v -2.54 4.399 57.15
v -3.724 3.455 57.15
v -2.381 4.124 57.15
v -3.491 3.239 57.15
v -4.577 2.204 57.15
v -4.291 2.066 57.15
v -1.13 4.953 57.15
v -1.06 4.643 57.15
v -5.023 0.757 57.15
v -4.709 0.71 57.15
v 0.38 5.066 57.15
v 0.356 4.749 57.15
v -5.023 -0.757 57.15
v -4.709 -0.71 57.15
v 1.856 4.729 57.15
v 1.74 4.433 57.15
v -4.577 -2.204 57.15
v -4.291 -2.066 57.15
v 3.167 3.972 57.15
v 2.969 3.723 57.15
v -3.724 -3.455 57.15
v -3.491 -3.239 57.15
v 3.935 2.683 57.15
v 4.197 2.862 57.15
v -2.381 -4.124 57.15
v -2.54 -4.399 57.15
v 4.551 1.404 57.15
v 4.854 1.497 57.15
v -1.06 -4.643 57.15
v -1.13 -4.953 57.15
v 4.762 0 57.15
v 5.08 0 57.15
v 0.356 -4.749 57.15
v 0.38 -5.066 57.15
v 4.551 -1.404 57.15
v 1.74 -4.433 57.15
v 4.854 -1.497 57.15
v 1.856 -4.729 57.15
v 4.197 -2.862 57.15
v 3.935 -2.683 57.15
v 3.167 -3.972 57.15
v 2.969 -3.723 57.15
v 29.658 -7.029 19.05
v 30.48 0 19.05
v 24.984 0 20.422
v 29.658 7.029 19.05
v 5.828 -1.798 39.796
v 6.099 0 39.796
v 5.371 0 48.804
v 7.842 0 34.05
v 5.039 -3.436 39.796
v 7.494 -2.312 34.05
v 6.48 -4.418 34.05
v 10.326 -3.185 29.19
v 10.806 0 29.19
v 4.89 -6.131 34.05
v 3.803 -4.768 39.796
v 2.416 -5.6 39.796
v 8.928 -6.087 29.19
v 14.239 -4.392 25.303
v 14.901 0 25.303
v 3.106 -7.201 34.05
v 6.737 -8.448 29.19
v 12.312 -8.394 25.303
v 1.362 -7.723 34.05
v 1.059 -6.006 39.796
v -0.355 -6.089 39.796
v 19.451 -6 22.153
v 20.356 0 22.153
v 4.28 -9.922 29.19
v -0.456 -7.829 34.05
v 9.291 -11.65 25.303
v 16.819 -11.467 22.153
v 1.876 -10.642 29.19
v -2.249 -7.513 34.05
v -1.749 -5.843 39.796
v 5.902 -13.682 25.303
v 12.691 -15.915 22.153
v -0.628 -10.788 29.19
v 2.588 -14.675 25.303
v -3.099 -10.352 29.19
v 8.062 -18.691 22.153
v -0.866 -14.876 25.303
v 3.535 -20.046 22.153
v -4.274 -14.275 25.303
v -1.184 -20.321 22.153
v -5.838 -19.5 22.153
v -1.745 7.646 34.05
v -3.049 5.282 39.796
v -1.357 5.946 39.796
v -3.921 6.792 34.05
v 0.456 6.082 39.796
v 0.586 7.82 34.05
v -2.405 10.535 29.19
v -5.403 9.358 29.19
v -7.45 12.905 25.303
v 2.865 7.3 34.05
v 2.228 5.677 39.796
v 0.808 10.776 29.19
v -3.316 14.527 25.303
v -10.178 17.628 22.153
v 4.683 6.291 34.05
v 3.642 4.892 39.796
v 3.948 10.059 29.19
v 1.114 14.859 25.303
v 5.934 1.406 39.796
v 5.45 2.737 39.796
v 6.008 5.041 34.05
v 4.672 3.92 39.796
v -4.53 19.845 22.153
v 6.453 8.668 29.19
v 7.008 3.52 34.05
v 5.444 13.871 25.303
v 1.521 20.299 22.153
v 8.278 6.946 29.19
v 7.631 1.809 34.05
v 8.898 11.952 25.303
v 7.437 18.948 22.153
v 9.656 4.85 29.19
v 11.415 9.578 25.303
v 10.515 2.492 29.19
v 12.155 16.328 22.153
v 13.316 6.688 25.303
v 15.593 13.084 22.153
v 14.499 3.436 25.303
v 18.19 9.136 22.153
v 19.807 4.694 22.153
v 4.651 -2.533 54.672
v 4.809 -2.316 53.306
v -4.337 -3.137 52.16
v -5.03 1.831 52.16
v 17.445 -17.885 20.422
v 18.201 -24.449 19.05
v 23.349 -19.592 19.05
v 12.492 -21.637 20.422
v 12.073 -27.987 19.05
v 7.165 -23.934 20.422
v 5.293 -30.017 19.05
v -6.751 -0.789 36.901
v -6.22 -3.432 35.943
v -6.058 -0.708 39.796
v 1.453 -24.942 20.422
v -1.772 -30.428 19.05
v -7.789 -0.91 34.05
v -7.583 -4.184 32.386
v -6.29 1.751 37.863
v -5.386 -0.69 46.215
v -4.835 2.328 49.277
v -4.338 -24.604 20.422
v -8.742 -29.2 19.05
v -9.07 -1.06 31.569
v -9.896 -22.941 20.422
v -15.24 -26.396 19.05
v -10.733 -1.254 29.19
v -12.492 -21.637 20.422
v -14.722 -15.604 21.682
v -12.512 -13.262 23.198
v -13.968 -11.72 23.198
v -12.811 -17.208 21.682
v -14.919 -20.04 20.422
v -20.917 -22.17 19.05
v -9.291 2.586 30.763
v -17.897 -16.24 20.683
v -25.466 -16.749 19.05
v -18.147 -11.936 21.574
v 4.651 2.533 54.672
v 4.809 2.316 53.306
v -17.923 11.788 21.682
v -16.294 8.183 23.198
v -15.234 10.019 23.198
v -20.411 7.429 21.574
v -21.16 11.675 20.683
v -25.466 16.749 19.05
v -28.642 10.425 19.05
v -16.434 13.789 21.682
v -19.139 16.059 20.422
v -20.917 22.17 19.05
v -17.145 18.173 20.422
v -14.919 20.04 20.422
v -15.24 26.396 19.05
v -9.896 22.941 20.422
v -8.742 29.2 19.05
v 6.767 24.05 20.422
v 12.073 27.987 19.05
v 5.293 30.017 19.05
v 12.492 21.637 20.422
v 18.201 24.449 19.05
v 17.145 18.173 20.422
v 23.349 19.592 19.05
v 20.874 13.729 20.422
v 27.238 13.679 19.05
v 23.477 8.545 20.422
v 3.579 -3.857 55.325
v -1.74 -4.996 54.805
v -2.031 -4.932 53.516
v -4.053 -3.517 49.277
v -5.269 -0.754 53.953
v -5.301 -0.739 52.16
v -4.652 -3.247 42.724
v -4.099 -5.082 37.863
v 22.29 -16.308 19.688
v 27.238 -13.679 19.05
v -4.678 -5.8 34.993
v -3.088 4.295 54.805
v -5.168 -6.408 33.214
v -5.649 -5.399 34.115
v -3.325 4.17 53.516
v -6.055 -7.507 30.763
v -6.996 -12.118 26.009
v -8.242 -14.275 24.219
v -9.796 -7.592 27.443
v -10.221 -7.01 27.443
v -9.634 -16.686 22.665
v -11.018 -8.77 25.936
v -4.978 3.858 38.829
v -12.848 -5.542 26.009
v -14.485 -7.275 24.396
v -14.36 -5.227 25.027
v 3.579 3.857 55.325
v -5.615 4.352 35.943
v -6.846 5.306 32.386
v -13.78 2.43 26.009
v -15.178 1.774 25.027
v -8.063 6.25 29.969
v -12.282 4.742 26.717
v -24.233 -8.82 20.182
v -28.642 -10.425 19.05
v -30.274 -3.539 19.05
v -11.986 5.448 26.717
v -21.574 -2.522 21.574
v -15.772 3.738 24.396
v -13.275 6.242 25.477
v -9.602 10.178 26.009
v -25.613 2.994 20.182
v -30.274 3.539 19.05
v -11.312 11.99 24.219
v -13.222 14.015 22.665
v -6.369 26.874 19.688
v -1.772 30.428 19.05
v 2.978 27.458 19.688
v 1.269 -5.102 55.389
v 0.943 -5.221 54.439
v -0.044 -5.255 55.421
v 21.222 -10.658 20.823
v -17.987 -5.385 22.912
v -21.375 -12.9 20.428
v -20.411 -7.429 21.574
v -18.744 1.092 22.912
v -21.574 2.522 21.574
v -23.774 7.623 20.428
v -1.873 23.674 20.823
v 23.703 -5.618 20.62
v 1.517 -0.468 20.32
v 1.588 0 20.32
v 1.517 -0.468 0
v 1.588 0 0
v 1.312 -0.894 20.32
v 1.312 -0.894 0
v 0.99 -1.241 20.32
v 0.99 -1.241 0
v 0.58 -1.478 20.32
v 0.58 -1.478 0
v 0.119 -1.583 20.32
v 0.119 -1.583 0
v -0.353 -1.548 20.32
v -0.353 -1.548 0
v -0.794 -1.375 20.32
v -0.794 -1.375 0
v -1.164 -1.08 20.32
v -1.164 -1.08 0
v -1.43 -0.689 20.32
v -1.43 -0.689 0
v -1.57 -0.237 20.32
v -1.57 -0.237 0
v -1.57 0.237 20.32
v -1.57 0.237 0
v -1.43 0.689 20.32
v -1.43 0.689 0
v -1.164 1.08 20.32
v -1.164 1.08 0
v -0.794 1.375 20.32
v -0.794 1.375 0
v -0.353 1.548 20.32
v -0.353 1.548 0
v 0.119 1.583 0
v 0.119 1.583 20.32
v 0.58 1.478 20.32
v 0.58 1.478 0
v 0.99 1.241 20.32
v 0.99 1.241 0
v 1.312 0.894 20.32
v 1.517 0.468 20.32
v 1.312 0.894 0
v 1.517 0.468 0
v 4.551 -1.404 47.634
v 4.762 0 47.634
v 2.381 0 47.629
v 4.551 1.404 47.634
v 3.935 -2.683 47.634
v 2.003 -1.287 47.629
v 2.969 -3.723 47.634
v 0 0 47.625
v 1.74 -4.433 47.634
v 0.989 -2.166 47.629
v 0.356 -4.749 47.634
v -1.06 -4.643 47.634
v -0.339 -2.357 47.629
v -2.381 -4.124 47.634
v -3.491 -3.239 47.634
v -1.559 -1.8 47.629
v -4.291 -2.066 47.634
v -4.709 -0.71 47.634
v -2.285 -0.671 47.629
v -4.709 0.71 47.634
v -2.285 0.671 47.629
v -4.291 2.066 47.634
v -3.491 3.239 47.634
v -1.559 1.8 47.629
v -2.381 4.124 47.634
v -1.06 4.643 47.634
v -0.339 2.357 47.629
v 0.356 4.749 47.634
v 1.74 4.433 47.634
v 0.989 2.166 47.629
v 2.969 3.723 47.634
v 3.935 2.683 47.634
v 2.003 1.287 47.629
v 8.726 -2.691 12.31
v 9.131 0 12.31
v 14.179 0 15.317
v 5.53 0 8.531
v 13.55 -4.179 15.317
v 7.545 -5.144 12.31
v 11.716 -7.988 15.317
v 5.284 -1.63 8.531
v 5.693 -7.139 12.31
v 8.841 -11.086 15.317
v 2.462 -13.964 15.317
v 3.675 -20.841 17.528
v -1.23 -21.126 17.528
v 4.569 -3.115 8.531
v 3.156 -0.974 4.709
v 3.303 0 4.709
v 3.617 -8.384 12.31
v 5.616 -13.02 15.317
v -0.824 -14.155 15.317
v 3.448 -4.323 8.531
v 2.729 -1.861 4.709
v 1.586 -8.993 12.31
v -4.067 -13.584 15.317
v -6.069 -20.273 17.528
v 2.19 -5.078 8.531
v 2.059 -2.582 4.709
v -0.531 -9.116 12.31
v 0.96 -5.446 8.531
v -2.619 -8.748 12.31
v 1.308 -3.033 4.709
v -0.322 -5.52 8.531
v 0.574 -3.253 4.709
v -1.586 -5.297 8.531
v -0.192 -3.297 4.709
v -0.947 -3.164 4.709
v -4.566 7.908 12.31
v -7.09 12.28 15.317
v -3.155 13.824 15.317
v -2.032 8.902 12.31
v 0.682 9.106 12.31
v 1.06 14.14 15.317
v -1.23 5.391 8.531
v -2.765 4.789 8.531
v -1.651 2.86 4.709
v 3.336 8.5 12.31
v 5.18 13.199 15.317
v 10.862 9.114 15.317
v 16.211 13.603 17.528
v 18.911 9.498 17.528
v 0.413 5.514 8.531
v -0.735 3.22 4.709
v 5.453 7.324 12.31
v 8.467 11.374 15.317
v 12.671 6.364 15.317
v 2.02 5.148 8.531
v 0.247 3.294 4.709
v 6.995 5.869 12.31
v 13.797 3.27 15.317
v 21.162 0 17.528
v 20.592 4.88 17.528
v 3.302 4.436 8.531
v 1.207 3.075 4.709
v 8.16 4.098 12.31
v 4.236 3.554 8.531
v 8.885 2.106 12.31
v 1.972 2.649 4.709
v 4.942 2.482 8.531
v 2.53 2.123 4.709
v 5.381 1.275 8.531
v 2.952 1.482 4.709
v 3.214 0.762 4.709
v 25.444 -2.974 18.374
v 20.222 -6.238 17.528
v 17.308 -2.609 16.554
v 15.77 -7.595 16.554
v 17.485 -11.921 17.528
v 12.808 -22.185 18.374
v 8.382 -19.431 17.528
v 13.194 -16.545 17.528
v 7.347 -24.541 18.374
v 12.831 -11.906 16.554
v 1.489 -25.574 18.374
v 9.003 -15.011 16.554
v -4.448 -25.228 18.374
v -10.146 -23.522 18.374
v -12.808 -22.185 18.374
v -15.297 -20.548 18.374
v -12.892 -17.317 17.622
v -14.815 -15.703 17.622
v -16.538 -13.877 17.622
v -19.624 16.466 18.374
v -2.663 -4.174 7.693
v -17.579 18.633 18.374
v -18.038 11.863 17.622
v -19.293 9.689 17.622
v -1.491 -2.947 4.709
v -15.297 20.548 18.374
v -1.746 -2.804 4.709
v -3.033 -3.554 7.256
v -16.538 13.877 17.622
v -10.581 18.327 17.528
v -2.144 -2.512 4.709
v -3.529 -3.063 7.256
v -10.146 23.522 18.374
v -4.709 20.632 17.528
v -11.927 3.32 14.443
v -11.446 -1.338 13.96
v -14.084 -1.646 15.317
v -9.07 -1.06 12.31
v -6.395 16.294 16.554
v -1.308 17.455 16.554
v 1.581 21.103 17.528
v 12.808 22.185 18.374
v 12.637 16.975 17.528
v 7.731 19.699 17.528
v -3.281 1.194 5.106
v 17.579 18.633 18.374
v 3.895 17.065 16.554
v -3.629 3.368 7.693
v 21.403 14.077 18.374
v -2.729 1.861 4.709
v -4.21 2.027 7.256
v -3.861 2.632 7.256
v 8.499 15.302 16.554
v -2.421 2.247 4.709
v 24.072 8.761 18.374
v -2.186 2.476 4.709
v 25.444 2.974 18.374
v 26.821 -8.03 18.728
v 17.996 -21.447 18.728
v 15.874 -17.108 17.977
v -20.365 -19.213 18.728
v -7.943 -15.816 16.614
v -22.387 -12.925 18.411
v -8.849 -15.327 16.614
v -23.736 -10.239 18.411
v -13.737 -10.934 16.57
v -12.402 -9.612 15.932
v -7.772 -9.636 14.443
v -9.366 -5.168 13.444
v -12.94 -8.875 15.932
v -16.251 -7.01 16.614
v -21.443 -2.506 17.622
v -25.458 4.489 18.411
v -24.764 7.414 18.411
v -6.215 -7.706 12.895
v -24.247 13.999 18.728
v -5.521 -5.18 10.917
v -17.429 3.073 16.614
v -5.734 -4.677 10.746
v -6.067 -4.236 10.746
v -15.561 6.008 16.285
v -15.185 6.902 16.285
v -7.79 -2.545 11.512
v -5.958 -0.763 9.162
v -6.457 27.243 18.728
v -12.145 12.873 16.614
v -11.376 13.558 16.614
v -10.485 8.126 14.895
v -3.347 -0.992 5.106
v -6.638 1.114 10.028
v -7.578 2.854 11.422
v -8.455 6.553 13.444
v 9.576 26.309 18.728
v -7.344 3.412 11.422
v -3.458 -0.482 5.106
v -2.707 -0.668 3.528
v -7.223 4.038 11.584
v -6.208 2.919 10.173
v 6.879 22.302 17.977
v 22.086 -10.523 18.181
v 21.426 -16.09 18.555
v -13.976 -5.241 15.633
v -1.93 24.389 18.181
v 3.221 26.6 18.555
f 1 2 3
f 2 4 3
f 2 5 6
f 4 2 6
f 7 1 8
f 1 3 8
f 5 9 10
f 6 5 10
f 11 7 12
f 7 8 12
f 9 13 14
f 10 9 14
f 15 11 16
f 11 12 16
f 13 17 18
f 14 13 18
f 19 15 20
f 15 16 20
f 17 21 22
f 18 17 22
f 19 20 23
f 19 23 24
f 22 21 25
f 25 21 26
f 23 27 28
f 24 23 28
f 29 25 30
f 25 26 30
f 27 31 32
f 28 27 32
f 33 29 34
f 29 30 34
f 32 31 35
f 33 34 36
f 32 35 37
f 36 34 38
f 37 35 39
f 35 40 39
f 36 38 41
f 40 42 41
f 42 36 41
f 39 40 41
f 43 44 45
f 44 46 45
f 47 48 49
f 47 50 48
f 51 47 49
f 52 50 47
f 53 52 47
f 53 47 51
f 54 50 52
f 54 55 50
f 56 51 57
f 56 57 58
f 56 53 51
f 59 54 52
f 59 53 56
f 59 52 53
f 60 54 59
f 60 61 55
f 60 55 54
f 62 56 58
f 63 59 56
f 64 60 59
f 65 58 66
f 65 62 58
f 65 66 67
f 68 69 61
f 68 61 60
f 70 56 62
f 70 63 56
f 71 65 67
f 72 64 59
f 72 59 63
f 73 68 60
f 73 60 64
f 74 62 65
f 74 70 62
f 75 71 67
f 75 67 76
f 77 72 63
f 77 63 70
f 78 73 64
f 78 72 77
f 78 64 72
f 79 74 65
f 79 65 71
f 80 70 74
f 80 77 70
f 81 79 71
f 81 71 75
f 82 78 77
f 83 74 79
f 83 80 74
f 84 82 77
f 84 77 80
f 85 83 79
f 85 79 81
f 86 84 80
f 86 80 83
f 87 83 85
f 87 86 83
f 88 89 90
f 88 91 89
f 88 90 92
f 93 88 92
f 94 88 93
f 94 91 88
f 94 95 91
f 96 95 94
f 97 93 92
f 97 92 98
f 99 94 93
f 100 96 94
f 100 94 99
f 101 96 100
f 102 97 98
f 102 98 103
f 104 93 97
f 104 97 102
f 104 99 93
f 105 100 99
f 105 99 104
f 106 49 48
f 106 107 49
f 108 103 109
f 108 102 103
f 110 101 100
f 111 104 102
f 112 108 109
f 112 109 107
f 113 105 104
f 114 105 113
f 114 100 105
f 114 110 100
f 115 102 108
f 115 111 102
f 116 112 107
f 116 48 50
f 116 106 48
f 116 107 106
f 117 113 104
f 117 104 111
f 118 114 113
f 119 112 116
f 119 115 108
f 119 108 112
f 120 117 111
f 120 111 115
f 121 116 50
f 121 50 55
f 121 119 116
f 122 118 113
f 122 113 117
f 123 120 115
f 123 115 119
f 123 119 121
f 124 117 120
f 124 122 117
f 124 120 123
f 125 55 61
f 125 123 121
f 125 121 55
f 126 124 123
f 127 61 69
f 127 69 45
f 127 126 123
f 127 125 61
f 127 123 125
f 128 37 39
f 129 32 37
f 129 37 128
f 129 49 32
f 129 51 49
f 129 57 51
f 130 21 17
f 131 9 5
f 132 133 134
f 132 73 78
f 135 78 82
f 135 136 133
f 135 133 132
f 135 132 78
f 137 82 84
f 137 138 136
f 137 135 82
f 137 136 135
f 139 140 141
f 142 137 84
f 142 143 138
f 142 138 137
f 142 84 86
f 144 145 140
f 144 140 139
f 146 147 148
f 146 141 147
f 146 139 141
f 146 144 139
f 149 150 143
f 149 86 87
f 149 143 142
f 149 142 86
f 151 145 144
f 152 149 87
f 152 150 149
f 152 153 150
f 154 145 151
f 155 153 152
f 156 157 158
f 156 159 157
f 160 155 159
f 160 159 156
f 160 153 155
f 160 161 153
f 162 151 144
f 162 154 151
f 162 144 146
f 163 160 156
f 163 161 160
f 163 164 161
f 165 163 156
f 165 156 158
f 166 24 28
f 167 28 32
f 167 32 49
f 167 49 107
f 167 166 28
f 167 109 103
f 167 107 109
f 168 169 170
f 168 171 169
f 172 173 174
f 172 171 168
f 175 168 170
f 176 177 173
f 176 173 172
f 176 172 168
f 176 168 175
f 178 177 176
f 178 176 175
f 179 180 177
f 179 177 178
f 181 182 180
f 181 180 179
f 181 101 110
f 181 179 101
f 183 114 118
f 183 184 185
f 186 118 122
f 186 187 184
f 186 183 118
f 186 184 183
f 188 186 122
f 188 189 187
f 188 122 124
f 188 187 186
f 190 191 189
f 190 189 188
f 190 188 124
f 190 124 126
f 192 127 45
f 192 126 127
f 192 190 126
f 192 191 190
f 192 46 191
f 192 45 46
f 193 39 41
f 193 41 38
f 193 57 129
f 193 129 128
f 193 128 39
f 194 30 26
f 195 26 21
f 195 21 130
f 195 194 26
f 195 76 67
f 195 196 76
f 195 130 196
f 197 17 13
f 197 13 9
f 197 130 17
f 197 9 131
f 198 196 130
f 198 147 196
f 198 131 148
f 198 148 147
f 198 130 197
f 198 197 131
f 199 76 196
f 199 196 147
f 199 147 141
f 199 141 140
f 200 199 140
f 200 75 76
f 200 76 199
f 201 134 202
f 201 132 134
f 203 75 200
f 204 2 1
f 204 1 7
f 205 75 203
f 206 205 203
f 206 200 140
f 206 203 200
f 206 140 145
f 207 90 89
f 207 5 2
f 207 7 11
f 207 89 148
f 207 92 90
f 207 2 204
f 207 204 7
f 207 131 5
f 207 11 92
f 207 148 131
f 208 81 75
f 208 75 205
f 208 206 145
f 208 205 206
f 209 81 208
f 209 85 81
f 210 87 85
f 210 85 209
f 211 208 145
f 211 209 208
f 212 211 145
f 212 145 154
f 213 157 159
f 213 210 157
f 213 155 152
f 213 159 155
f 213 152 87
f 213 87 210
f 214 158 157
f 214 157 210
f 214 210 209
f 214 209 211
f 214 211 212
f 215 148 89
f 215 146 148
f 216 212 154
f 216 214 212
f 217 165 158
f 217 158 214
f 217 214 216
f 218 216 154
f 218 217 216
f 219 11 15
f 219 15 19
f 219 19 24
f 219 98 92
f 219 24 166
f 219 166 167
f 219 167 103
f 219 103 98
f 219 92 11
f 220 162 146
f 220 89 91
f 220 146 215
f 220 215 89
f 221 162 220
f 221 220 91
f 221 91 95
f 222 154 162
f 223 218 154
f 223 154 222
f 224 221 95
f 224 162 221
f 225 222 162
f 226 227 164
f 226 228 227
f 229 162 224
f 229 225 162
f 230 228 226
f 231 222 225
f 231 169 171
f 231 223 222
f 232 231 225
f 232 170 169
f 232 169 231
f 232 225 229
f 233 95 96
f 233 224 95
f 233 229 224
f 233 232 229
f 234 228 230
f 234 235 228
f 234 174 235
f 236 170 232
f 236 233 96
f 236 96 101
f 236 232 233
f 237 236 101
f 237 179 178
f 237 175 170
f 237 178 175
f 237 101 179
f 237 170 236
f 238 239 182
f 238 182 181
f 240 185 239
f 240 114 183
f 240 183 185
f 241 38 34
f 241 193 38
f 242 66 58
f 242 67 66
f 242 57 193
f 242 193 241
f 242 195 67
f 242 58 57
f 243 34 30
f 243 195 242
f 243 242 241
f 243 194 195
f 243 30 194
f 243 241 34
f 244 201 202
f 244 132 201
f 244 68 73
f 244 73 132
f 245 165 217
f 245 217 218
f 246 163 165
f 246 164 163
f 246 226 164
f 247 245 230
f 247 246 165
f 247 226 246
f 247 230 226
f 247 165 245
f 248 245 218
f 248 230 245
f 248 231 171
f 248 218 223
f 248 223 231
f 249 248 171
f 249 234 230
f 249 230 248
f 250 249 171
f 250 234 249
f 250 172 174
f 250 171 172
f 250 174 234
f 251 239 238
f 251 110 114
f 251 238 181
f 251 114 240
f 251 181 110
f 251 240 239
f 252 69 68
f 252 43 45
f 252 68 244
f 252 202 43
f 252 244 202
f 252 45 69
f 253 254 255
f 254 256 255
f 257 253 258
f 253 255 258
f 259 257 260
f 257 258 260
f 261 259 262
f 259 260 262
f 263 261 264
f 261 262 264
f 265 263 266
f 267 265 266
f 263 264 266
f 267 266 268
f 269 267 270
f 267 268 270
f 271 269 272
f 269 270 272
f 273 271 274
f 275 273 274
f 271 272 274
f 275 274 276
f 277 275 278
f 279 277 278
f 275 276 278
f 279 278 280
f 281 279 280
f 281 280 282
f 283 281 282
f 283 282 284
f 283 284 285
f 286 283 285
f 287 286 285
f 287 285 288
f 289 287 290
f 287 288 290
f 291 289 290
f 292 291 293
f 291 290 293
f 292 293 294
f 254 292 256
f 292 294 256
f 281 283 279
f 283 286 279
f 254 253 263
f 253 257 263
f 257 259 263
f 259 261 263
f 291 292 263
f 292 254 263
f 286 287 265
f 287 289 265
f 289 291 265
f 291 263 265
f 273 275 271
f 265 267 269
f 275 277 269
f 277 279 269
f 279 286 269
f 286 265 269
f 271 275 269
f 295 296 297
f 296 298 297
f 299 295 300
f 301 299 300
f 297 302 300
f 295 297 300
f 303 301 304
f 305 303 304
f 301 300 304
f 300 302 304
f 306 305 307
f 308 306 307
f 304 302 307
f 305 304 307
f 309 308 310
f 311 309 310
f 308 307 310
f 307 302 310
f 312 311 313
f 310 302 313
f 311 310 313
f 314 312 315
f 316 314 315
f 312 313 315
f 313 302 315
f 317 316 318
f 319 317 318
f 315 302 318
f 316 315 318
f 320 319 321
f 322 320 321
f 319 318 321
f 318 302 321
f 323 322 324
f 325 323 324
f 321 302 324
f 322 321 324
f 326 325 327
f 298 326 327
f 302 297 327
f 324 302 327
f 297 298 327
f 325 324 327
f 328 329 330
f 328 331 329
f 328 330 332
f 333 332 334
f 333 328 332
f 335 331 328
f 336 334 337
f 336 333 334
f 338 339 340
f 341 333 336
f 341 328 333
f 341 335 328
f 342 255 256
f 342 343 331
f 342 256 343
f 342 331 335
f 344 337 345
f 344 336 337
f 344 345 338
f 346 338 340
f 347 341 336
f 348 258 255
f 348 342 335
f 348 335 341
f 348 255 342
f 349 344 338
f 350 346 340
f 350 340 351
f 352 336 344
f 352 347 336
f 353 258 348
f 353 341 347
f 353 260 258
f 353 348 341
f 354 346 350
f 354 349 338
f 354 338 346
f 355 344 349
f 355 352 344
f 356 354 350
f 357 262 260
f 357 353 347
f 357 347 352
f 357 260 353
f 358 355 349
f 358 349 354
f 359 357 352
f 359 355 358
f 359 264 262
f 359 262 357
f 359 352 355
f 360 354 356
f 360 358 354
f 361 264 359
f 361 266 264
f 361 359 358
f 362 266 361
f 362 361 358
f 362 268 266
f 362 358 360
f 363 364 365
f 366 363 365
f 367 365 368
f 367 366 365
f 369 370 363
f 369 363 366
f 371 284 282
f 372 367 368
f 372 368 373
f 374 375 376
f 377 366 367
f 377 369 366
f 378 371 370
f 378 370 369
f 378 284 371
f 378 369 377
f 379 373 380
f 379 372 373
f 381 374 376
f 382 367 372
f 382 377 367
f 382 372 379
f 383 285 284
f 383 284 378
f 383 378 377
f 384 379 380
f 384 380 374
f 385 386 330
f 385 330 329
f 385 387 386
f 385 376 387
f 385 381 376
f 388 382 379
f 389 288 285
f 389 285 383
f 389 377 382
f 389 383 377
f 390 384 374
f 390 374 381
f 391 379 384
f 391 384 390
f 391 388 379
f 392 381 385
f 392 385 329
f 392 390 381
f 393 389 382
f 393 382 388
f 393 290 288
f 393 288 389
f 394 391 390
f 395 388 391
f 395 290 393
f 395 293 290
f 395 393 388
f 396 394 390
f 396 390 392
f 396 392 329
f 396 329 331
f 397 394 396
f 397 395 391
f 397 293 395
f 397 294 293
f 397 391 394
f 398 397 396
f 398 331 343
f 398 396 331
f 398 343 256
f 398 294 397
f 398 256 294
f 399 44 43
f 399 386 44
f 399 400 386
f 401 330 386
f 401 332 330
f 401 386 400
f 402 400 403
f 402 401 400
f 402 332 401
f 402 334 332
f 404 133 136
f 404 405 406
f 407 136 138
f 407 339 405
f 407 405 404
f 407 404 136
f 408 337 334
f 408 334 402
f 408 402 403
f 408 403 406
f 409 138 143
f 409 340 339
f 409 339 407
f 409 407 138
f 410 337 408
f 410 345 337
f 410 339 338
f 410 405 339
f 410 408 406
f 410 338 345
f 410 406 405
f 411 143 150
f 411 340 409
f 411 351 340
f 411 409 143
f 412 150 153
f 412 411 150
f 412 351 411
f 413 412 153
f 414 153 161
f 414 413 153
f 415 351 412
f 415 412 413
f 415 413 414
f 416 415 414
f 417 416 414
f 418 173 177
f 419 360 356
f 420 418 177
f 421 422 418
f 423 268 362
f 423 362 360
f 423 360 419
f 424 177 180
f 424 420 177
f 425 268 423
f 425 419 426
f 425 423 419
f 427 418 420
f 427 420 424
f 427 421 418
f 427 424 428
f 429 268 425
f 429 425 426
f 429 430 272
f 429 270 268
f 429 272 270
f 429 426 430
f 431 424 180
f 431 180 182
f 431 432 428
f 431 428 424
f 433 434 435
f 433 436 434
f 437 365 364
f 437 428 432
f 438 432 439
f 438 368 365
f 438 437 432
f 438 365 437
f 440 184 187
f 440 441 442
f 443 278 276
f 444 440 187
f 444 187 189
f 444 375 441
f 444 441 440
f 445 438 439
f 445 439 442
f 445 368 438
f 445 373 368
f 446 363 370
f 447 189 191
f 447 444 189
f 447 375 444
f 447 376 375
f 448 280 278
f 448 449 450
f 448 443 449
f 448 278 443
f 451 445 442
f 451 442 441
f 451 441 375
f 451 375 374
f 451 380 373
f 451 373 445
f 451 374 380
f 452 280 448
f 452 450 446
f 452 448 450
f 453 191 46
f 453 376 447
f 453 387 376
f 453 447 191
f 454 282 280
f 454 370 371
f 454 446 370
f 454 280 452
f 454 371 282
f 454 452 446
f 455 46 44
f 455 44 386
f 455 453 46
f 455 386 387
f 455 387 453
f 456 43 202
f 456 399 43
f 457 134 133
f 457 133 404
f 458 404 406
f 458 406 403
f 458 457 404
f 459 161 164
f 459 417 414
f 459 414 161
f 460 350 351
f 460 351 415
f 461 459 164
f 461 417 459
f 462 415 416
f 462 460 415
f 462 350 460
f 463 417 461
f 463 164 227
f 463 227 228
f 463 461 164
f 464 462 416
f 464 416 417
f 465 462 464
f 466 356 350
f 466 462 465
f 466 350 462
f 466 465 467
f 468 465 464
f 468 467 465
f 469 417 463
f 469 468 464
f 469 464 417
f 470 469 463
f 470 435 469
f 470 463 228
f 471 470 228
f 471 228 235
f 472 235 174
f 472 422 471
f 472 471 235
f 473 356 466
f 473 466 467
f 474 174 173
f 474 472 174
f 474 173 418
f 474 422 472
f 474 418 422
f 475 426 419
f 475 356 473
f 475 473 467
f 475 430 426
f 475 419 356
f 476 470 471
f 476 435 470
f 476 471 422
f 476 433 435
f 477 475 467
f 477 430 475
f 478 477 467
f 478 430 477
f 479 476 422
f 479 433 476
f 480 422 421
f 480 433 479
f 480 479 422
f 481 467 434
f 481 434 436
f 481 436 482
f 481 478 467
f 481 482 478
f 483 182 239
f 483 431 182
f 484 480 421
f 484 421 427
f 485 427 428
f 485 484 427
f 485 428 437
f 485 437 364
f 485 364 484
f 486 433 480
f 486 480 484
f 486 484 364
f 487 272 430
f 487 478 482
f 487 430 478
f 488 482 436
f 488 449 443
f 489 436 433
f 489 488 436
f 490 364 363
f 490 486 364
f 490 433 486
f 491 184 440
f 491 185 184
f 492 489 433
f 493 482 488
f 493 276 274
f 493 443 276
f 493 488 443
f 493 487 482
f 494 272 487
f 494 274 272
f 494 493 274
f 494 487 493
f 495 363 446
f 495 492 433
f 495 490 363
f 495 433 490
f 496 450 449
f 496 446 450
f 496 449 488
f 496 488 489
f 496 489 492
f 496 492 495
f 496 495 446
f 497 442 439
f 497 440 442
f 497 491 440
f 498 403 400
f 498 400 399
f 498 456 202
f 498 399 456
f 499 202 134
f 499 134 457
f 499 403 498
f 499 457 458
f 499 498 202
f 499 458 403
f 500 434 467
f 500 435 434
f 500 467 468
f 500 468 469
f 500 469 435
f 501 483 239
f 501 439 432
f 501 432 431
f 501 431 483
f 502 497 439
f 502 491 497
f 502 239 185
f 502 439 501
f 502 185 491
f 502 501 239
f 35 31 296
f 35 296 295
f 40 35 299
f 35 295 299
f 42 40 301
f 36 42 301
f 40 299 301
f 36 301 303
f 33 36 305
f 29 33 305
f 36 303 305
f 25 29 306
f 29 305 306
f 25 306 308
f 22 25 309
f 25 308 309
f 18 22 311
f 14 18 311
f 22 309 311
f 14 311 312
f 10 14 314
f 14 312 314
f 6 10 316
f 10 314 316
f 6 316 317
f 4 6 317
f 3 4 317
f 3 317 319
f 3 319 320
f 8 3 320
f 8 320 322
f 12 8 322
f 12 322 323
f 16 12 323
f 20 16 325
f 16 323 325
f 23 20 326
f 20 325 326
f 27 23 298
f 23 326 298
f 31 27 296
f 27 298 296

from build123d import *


with BuildPart() as f1:
    # F0 (on Front) → F1 (revolve)
    with BuildSketch(Plane.XZ):
        with BuildLine():
            Line((4.7625, 47.633519), (0, 47.625))
            Line((0, 47.625), (0, 20.32))
            Line((0, 20.32), (1.5875, 20.32))
            Line((1.5875, 20.32), (1.5875, 0))
            add(Edge.make_bspline(
                [(30.48, 19.05), (15.280179, 17.193271), (5.565798, 14.151044), (1.5875, 0)],
                knots=[0, 0, 0, 0, 34.6075, 34.6075, 34.6075, 34.6075], degree=3))
            add(Edge.make_bspline(
                [(5.08, 57.15), (6.557812, 46.993788), (0, 25.078584), (30.48, 19.05)],
                knots=[0, 0, 0, 0, 45.790501, 45.790501, 45.790501, 45.790501], degree=3))
            Line((5.08, 57.15), (4.7625, 57.15))
            Line((4.7625, 57.15), (4.7625, 47.633519))
        make_face()
    revolve(axis=Axis((0, 0, 28.575), (0, 0, -1)))


solid = f1.part
